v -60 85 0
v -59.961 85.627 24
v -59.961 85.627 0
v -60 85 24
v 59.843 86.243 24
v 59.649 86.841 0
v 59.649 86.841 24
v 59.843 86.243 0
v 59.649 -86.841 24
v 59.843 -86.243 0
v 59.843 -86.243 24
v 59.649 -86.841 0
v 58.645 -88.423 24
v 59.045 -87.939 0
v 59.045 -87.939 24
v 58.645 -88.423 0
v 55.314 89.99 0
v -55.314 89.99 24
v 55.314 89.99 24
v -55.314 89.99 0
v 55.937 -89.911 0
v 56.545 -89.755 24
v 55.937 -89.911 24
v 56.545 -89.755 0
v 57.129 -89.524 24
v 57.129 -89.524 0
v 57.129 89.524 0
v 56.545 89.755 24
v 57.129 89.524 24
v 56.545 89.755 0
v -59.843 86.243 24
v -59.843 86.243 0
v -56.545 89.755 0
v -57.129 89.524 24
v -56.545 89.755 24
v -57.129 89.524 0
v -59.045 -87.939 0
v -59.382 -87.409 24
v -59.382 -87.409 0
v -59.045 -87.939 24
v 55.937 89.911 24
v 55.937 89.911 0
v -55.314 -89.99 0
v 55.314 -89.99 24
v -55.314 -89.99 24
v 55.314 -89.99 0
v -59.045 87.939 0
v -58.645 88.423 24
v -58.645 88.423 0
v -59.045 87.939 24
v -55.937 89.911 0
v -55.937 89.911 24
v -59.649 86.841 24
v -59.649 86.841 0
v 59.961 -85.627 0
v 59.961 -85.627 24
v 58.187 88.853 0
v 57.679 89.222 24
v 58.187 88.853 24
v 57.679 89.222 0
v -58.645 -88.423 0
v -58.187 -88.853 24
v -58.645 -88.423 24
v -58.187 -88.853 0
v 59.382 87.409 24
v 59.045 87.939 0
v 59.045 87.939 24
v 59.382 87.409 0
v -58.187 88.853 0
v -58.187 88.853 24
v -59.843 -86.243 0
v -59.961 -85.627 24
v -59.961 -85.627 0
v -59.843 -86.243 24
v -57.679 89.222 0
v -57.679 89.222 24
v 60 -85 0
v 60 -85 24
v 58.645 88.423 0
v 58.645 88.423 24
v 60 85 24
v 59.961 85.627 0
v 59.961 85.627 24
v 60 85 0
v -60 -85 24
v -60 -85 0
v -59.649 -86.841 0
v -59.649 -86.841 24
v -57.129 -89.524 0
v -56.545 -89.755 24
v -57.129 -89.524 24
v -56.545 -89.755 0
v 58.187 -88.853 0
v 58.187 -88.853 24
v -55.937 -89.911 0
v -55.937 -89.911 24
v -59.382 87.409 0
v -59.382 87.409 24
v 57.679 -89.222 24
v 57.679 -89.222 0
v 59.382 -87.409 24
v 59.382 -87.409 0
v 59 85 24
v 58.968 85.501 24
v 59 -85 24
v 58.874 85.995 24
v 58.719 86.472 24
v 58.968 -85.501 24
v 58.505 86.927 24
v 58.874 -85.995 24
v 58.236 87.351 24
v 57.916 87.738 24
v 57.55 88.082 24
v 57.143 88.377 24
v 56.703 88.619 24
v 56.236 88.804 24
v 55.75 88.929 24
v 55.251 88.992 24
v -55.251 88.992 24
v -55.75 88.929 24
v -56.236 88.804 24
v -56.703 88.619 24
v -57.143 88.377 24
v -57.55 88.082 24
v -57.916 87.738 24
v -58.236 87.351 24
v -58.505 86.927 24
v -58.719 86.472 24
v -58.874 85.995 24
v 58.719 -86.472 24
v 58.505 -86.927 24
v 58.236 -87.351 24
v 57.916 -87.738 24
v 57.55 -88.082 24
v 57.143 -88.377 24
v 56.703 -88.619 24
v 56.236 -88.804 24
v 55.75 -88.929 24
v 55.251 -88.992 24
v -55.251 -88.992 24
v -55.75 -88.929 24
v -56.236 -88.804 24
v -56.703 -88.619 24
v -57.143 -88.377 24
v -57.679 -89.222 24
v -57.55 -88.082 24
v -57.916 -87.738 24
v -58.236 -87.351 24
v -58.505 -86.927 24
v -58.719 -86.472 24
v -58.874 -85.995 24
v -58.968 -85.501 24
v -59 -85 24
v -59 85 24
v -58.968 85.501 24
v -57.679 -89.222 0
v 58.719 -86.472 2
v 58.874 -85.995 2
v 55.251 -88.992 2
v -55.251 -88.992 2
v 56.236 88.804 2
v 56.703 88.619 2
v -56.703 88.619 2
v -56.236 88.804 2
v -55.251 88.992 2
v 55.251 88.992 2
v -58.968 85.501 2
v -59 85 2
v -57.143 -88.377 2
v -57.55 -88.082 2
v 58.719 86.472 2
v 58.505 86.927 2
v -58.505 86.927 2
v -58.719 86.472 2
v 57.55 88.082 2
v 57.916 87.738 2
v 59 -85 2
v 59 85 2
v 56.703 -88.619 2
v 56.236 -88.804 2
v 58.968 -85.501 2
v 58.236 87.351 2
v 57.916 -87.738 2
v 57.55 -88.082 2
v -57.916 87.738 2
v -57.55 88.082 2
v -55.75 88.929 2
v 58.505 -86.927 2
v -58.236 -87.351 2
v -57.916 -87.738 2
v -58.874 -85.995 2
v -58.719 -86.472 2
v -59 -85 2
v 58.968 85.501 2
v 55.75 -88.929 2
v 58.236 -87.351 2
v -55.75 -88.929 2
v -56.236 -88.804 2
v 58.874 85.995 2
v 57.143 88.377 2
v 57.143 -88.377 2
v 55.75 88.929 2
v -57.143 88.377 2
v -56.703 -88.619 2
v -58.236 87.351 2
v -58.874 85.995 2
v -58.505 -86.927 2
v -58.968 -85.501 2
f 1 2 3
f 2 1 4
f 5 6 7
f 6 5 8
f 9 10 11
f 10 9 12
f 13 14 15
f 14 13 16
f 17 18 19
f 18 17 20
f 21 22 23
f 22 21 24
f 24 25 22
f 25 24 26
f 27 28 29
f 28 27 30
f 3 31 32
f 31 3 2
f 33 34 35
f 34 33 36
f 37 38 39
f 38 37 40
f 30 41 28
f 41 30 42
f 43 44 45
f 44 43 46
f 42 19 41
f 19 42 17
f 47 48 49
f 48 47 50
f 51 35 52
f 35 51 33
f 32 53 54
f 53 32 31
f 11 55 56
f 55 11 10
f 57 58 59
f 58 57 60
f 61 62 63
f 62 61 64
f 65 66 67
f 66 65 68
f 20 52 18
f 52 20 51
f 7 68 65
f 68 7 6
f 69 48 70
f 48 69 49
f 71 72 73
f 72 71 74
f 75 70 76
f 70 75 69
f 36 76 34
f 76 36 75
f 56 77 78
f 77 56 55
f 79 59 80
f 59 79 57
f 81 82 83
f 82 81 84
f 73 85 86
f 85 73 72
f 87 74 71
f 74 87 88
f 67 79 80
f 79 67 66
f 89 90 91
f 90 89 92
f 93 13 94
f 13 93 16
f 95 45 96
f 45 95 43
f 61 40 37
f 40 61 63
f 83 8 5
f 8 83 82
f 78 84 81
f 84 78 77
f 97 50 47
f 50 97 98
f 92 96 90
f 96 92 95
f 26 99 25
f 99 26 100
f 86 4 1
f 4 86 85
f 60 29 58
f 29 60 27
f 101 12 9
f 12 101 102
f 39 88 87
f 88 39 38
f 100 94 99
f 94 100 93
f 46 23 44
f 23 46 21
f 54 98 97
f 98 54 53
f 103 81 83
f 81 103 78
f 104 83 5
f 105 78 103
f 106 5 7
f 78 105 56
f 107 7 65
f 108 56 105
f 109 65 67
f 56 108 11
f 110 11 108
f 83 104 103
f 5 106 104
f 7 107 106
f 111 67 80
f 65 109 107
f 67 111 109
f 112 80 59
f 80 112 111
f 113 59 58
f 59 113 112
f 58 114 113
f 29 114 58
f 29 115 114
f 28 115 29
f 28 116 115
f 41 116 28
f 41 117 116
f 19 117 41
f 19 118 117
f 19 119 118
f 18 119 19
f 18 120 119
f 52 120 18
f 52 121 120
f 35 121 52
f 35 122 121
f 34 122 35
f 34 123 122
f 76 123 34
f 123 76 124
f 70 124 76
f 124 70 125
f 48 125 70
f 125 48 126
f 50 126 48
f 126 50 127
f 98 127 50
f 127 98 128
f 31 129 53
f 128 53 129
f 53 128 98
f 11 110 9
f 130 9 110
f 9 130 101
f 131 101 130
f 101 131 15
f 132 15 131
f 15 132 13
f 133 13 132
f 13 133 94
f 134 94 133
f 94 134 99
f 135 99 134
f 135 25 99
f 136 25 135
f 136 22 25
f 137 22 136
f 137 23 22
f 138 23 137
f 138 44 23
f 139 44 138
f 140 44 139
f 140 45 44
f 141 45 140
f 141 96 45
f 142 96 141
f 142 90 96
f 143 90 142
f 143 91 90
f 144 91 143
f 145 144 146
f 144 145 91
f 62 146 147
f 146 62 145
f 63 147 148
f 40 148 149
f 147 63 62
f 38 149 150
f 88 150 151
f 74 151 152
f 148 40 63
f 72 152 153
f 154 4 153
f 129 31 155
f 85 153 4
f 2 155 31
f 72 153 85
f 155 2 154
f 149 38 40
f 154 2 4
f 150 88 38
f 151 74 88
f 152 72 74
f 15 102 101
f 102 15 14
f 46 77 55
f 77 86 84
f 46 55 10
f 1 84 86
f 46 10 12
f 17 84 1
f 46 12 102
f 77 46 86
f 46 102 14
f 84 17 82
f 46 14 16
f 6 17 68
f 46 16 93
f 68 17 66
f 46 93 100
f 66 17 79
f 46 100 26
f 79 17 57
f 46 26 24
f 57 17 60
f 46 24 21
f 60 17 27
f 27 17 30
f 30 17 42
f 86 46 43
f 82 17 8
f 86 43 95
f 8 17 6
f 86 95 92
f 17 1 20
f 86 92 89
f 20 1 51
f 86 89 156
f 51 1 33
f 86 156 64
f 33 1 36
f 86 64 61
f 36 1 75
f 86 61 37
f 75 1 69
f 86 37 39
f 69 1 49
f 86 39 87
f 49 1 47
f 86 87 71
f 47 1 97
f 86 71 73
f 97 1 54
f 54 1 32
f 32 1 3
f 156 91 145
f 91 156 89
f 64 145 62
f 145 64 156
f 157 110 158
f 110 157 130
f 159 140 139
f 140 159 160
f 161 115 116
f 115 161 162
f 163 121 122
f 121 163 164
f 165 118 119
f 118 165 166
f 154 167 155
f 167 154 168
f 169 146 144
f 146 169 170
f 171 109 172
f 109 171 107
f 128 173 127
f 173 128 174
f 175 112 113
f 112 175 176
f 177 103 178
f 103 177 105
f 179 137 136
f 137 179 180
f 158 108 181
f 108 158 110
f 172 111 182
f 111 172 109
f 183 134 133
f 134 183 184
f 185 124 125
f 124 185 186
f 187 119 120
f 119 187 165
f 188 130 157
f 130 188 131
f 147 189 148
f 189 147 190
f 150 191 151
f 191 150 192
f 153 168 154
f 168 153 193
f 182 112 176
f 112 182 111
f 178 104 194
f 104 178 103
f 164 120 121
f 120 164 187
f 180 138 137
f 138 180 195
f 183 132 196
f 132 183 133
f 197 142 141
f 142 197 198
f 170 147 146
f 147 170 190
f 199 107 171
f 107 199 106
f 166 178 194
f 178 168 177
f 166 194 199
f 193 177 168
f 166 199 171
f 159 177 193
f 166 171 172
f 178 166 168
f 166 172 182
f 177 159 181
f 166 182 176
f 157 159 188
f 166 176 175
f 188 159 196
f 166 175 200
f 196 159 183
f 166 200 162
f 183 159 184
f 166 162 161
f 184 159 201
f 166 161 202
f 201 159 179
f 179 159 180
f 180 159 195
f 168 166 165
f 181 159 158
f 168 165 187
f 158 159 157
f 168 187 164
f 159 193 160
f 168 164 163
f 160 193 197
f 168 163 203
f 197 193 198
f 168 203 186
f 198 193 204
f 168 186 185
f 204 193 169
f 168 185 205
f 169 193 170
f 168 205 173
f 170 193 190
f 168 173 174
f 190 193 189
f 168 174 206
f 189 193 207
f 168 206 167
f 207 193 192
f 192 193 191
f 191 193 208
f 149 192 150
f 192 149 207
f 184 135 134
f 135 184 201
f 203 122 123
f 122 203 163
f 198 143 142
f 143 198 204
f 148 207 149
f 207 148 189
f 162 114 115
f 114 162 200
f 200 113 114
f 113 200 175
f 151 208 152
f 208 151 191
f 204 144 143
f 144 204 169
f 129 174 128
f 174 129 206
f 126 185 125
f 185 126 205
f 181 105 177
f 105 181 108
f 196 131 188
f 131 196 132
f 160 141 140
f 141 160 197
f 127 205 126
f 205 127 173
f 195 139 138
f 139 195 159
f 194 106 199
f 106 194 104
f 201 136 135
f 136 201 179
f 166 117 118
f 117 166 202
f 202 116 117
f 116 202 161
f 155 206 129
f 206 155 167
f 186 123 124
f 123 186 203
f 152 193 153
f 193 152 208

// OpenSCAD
$fn = 50;


difference() {
	union() {
		hull() {
			translate(v = [-55.0000000000, 85.0000000000, 0]) {
				cylinder(h = 24, r = 5);
			}
			translate(v = [55.0000000000, 85.0000000000, 0]) {
				cylinder(h = 24, r = 5);
			}
			translate(v = [-55.0000000000, -85.0000000000, 0]) {
				cylinder(h = 24, r = 5);
			}
			translate(v = [55.0000000000, -85.0000000000, 0]) {
				cylinder(h = 24, r = 5);
			}
		}
	}
	union() {
		translate(v = [0, 0, 2]) {
			hull() {
				translate(v = [-55.0000000000, 85.0000000000, 0]) {
					cylinder(h = 22, r = 4);
				}
				translate(v = [55.0000000000, 85.0000000000, 0]) {
					cylinder(h = 22, r = 4);
				}
				translate(v = [-55.0000000000, -85.0000000000, 0]) {
					cylinder(h = 22, r = 4);
				}
				translate(v = [55.0000000000, -85.0000000000, 0]) {
					cylinder(h = 22, r = 4);
				}
			}
		}
	}
}
